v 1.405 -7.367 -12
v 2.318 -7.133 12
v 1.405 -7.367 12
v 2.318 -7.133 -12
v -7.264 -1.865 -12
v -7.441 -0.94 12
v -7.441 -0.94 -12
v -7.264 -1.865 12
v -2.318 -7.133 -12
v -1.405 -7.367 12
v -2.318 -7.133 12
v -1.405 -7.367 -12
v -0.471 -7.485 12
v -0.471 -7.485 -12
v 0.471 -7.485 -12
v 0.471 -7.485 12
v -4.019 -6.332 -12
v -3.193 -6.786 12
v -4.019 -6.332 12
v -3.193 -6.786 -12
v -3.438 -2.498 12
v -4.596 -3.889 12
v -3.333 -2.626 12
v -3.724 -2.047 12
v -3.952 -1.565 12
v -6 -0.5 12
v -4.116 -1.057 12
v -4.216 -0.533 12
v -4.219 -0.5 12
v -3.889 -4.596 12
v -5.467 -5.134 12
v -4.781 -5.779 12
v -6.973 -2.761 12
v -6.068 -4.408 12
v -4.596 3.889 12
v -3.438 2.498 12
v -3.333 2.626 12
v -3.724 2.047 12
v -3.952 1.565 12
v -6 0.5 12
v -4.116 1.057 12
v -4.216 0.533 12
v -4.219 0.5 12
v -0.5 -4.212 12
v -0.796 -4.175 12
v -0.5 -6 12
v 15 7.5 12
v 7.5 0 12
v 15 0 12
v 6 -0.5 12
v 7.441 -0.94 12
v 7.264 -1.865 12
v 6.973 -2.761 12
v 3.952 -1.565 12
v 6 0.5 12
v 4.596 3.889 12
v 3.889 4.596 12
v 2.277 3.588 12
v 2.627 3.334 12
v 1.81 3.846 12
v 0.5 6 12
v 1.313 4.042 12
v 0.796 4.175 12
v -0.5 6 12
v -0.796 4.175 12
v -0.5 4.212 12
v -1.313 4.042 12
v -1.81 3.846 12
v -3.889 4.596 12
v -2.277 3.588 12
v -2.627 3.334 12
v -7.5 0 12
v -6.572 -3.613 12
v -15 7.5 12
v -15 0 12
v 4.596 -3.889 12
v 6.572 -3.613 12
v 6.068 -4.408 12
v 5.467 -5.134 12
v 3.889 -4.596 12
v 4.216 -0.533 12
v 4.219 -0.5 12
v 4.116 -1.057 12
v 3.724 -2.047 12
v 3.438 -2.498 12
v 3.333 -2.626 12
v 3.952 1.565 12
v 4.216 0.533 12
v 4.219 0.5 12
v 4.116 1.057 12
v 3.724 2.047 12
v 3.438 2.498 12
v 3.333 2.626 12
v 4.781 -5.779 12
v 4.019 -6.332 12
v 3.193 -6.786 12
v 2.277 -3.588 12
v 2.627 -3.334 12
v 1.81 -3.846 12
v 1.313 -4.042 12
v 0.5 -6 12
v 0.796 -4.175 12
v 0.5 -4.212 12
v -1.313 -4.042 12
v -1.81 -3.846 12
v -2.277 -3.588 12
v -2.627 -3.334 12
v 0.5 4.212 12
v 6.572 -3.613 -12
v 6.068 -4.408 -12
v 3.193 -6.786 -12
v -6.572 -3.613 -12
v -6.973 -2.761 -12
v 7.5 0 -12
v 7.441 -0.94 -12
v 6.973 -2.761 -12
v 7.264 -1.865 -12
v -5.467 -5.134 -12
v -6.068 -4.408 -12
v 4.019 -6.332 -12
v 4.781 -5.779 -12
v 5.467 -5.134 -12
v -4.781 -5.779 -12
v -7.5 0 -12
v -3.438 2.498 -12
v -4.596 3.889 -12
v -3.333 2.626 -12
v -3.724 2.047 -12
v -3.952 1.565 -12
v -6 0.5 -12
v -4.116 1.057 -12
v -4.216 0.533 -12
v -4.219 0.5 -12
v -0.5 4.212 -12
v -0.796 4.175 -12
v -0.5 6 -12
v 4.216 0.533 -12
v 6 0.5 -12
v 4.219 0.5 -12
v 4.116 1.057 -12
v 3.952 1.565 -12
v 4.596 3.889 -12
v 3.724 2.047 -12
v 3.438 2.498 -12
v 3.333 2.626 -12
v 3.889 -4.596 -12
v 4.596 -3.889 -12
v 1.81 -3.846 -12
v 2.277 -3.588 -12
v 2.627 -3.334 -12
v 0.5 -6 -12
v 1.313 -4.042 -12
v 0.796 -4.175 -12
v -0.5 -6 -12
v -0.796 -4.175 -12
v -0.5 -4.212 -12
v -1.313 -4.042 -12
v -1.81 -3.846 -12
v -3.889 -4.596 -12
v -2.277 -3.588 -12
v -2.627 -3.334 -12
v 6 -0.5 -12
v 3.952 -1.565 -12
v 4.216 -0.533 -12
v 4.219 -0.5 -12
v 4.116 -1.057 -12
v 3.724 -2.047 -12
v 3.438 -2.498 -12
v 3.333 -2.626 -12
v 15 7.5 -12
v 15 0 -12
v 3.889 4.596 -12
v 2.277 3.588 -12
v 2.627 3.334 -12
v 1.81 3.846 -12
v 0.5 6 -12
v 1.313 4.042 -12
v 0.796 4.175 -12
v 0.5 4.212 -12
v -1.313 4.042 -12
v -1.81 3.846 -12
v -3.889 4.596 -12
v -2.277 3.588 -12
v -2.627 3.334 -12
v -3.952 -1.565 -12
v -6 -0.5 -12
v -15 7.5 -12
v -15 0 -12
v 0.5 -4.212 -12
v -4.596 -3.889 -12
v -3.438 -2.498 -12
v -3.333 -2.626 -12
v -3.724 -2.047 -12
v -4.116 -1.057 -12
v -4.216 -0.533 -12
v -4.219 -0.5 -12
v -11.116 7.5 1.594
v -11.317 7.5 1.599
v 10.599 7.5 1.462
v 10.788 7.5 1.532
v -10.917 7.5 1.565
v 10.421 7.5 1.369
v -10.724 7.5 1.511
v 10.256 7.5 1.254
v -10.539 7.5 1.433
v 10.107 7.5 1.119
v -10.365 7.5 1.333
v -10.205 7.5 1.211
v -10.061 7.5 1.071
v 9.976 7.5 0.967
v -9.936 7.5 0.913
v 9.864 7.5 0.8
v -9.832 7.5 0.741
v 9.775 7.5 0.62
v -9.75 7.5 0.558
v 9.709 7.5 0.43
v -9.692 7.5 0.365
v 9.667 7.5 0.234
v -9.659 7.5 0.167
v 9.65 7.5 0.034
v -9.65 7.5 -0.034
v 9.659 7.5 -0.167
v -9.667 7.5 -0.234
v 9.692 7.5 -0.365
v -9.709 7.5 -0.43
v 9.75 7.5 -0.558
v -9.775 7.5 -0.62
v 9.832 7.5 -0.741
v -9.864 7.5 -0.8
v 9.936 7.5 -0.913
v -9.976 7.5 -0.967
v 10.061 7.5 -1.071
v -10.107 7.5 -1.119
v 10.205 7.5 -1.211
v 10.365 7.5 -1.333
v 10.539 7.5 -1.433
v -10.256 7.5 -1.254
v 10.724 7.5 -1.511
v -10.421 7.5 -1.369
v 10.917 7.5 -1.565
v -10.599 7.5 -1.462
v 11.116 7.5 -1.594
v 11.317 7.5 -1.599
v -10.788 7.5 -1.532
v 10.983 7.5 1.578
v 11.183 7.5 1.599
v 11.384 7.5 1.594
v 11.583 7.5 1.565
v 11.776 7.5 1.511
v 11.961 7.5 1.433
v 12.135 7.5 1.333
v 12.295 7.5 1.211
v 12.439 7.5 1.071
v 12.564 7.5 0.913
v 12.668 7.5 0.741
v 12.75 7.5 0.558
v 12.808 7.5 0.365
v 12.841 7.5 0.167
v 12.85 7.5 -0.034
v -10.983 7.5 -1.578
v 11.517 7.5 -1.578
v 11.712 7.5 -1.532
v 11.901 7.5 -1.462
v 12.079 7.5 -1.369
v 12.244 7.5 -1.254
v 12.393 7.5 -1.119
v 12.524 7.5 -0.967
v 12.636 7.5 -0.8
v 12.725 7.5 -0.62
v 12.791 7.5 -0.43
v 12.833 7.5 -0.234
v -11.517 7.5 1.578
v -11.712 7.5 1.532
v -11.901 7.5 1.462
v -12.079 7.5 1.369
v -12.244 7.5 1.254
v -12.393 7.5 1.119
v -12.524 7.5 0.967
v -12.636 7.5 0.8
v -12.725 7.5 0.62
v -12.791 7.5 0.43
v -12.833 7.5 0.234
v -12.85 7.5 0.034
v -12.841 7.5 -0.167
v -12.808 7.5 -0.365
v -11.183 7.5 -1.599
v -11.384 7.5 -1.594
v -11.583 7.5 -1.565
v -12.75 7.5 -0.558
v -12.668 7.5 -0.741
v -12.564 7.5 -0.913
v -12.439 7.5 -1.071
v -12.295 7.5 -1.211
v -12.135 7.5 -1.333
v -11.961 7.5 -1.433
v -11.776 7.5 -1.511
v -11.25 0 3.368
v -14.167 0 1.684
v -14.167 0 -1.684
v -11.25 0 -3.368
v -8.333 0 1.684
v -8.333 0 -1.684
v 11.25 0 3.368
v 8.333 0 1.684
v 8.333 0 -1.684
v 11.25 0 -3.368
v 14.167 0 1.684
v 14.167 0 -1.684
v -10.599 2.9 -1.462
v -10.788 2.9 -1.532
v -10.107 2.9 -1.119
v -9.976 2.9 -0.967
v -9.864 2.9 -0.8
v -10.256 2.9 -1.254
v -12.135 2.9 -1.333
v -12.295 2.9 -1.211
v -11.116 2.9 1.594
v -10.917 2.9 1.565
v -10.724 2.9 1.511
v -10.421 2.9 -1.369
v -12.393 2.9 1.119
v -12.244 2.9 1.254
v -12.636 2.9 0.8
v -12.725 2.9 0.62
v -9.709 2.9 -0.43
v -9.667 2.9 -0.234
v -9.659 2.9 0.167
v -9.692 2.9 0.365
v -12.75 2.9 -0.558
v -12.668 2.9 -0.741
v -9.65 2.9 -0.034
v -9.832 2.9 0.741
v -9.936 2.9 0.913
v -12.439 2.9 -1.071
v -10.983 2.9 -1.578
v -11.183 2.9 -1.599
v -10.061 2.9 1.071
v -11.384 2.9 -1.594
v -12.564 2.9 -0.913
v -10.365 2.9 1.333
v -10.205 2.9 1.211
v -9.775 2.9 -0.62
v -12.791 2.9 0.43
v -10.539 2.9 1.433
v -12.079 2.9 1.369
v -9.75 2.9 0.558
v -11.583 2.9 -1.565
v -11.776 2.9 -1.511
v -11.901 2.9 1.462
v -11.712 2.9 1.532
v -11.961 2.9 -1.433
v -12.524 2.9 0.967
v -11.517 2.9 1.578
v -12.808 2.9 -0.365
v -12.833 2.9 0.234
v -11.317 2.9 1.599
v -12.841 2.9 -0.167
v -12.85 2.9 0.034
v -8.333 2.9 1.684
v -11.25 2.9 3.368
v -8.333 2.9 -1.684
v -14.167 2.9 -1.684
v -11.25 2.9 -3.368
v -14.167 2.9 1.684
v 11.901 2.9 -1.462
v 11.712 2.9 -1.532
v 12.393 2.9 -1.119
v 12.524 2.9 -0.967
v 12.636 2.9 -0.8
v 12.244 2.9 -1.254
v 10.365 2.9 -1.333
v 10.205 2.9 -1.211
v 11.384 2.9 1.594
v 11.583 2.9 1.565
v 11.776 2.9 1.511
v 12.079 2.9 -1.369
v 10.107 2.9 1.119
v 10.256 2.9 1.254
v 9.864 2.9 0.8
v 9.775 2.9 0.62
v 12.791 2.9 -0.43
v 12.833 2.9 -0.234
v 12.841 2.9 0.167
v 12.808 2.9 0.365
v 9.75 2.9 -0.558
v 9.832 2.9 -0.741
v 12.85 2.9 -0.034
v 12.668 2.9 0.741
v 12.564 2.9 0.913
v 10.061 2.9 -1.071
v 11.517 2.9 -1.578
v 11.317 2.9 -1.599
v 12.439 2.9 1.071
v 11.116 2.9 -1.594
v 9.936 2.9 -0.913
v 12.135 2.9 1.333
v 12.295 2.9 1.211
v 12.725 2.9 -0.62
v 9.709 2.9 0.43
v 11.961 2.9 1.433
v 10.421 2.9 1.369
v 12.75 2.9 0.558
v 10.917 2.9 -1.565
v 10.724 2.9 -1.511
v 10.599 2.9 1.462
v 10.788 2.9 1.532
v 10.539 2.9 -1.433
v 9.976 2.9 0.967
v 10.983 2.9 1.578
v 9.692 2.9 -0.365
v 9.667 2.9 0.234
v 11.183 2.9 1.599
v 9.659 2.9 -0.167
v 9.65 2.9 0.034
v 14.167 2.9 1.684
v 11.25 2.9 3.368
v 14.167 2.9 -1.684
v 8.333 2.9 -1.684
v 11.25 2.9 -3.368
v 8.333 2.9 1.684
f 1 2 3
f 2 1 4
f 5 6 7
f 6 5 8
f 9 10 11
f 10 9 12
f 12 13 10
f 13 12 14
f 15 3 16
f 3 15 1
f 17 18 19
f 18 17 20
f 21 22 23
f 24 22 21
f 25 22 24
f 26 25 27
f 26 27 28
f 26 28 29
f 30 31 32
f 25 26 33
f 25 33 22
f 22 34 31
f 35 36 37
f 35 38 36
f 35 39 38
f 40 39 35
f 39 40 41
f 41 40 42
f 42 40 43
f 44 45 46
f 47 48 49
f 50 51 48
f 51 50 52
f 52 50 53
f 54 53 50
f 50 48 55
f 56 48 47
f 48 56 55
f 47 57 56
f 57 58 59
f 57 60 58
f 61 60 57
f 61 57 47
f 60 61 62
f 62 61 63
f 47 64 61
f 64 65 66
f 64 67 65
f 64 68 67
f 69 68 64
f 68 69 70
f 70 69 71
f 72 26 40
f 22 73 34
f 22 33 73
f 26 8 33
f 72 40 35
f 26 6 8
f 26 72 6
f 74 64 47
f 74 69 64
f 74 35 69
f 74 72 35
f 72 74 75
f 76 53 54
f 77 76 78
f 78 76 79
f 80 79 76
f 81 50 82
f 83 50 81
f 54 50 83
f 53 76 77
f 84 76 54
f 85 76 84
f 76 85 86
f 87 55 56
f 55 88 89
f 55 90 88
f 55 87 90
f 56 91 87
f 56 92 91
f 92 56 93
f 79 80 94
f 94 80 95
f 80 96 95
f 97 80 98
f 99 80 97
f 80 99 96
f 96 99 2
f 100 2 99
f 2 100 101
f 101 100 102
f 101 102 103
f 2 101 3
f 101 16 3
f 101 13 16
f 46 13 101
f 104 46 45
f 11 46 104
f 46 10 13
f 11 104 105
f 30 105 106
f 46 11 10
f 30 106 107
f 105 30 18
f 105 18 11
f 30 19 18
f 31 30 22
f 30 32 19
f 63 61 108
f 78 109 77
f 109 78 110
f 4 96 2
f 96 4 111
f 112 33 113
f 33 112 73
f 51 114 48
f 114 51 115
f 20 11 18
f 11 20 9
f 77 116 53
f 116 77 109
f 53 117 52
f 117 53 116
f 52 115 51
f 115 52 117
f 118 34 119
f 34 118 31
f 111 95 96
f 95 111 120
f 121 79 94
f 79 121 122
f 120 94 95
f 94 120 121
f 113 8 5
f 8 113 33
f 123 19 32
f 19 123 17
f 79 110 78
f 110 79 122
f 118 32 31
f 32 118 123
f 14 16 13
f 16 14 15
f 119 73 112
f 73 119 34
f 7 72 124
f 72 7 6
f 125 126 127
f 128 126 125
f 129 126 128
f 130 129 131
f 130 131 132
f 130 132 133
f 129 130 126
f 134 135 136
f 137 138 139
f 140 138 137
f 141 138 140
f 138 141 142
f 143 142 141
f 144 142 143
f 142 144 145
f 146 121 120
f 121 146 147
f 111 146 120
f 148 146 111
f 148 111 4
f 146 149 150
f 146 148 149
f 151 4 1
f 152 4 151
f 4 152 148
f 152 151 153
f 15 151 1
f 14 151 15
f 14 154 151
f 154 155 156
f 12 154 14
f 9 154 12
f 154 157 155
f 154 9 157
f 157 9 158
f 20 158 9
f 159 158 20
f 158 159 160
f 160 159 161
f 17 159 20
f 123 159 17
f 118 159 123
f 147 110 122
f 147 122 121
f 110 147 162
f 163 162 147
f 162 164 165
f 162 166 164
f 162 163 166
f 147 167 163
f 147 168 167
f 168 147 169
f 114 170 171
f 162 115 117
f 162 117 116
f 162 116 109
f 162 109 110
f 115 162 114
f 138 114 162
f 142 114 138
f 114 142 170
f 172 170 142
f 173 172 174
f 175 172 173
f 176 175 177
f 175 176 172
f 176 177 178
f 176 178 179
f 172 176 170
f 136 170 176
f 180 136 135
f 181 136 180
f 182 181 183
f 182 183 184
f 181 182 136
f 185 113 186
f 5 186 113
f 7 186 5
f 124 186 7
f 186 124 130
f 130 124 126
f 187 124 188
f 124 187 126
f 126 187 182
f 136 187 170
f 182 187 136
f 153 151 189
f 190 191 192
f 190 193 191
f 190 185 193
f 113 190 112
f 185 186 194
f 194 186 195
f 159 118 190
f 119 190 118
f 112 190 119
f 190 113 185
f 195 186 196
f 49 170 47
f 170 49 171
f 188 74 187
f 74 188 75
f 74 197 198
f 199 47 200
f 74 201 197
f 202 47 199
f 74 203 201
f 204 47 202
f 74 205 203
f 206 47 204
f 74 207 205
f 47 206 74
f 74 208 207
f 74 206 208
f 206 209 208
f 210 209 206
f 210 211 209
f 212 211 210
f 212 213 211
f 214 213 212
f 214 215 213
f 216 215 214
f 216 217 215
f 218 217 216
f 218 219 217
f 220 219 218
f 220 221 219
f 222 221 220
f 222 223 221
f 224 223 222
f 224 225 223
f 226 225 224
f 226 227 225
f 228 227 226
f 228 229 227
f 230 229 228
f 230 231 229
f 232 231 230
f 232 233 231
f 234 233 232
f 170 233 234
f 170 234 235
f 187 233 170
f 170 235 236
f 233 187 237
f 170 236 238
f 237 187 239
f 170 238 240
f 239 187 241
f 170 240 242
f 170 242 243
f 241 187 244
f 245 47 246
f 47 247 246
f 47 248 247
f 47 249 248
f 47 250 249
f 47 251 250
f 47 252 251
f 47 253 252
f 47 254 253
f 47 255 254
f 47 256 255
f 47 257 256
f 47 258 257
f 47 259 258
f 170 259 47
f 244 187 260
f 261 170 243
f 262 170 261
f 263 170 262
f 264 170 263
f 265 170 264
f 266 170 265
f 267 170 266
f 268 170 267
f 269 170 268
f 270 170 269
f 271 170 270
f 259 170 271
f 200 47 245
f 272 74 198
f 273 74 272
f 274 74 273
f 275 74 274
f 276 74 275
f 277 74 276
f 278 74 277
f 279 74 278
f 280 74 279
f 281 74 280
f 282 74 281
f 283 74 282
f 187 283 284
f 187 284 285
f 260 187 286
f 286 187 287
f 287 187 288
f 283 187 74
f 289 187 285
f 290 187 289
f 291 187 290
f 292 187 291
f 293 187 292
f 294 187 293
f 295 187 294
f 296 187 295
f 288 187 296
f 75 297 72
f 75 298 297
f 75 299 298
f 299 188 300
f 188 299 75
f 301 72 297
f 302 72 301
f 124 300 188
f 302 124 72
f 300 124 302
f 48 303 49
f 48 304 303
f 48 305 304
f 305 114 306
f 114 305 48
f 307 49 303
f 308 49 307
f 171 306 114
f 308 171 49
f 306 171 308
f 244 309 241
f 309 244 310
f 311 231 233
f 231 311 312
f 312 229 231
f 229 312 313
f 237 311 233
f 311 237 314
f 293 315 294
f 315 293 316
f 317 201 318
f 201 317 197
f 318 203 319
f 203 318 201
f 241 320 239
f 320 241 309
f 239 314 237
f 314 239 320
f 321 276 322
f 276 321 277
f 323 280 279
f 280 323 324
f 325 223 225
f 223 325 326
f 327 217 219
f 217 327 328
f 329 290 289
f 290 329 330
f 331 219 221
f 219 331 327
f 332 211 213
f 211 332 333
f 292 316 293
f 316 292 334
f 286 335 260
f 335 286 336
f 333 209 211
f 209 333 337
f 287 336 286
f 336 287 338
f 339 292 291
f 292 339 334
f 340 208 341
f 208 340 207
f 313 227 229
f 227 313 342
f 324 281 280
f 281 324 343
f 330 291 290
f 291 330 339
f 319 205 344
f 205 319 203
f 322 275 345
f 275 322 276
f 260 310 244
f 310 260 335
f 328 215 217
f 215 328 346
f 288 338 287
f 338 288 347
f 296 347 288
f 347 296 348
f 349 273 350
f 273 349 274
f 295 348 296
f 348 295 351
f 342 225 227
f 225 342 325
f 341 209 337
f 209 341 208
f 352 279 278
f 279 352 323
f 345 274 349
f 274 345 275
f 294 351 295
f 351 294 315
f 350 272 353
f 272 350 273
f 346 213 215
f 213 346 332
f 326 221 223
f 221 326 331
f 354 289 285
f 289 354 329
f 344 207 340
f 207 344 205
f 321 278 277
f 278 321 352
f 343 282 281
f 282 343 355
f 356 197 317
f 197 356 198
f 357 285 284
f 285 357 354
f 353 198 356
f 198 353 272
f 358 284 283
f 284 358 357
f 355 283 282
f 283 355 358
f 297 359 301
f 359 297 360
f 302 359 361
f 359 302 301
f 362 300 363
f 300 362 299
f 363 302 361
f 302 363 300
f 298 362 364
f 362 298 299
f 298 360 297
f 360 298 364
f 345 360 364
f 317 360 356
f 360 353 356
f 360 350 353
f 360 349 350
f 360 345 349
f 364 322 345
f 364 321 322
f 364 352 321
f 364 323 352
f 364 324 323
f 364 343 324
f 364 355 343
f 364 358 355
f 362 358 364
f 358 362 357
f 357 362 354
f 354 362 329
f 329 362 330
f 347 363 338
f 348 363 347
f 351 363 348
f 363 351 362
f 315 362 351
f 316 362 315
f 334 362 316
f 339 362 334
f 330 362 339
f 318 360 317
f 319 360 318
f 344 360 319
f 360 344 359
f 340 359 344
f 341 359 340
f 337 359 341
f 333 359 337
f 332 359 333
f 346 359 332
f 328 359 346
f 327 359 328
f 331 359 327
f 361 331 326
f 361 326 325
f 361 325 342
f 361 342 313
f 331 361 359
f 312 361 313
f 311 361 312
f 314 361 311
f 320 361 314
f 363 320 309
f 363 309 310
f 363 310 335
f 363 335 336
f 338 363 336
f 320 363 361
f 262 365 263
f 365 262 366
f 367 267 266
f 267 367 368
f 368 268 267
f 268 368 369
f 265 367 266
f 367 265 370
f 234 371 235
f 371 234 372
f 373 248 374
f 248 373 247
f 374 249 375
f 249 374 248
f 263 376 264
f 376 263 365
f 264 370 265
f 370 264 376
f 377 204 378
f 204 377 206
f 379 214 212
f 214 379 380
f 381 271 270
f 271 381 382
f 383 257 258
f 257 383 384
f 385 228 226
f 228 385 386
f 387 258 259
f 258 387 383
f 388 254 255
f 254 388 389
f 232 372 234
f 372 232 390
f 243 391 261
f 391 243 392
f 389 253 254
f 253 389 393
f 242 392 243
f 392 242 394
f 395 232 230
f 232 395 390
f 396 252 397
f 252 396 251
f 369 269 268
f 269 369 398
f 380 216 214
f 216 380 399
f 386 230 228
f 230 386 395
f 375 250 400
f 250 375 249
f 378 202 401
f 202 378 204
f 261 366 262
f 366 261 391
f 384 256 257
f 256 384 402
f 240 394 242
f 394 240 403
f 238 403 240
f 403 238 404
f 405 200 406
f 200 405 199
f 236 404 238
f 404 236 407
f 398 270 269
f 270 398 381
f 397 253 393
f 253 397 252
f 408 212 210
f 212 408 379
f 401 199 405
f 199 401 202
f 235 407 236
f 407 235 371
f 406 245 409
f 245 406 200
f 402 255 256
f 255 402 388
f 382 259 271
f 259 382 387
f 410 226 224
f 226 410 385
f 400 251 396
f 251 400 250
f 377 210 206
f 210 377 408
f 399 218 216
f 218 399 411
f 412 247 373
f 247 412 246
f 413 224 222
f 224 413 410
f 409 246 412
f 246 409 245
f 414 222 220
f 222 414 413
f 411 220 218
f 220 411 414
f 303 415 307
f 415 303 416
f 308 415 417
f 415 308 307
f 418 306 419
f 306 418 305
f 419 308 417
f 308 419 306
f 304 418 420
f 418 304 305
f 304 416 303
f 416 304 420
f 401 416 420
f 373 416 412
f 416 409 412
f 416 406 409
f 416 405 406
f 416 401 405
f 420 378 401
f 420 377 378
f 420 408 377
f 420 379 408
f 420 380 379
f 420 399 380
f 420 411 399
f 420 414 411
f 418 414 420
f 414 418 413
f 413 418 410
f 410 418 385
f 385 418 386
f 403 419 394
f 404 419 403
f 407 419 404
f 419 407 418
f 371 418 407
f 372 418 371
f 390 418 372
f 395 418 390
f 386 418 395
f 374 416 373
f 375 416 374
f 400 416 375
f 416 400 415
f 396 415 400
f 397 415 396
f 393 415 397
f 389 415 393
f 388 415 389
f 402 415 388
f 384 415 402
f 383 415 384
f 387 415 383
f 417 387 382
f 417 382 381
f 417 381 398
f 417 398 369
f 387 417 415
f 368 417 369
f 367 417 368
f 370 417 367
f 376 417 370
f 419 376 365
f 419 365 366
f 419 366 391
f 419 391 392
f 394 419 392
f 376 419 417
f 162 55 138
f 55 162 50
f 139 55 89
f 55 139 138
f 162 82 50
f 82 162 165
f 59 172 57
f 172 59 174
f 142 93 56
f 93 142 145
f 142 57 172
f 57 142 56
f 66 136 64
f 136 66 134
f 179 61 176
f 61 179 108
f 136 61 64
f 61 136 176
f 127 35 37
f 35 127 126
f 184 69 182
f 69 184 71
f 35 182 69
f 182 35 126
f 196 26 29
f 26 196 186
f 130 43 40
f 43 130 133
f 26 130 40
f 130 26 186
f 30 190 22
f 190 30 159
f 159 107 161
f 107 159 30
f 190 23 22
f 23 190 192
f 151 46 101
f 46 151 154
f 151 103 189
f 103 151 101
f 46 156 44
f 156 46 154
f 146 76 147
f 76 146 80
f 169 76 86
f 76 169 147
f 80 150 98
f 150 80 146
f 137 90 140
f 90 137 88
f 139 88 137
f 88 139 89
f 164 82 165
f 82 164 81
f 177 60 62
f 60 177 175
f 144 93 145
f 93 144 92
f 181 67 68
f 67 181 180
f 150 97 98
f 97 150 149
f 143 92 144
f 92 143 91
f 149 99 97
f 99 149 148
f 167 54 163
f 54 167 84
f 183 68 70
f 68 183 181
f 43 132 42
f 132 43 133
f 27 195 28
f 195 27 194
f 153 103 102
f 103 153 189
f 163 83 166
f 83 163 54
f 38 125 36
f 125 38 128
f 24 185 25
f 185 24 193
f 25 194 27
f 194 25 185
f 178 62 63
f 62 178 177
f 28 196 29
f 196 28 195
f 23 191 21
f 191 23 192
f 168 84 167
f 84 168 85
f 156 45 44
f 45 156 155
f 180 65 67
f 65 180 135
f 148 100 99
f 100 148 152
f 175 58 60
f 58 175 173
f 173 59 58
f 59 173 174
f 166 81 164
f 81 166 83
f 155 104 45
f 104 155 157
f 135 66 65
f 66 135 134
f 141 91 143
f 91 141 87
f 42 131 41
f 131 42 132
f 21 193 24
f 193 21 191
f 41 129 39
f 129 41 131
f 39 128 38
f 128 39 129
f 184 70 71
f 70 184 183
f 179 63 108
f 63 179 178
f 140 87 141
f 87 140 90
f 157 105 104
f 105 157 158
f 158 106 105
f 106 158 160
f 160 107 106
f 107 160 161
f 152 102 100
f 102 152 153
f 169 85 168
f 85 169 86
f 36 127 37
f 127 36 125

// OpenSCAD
/*
    To create plastic linear bearings similar to the Igus® Drylin® RJ4JP-01-08 Sliding Bearing.

    You can choose to either create just the bearing or incorporate it in a block ready to mount.
    
    print in PLA for the properties of the harder plastic also concidder some kind of lubrication.
    
    inspired by:
    Toothed Linear Bearing by KR2
    www.thingiverse.com/thing:18219
    
    And 
    
    SC8UU Bushing by AxMod
    www.thingiverse.com/thing:1126245
    

*/

/* [Bearing Settings]*/

Inside_Diameter = 8;
Outside_Diameter = 15;
Length = 24;
Wall_Thickness = 1.5;
Number_of_teeth = 8;


Block = "yes"; // [yes, no]

/* [Block Settings]*/

How_Many_Mounting_Holes = 2; //[0, 2, 4, 6]
//The Diameter of the mounting holes so for an M3 bolt put 3 if you want to cut your own thread or 3.4 if you prefer to use with a nut
Mounting_Holes_Diameter = 3.2;
// Size of the nut across it's flats
Nut_size = 5.4;
// Set to 0 if you do not want retaining holes for nut
Nut_Depth = 3;


// need to create the 30 degrees champher properly.

difference()
{
    union()
    {
        if (Block == "yes")
        {
            cylinder (h=Length, d= Outside_Diameter, center = true, $fn = 50);
            translate ([-Outside_Diameter,0,-0.5*Length]) cube([Outside_Diameter *2,0.5*Outside_Diameter, Length]);
        }
        if (Block == "no")
        {
        cylinder (h=Length -3, d= Outside_Diameter, center = true, $fn = 50);
        translate ([0,0,(Length - 3) /2]) cylinder (h=1.5 , d1= Outside_Diameter, d2 = Outside_Diameter-1.74, center = false, $fn = 50);
        translate ([0,0,-Length/2 ]) cylinder (h=1.5 , d2= Outside_Diameter, d1 = Outside_Diameter-1.74, center = false, $fn = 50);
        }
    }    
    cylinder (h=Length+ 0.2, d= Inside_Diameter+0.5, center = true, $fn = 50); // remove core
    
// remove bands on outside
    if (Block == "no")
    {
    translate ([0,0,(Length /2) - 3.25 - 1.1])
    {
        difference()
        {
            cylinder(h = 1.1, d= Outside_Diameter, center = false, $fn = 50);
            cylinder(h = 1.1, d= Outside_Diameter-0.4, center = false, $fn = 50);
        }
    }
    
        translate ([0,0,-(Length /2) + 3.25 ])
    {
        difference()
        {
            cylinder(h = 1.1, d= Outside_Diameter, center = false, $fn = 50);
            cylinder(h = 1.1, d= Outside_Diameter-0.4, center = false, $fn = 50);
        }
    }
    }
// Remove Mounting Holes for Block
    if (Block == "yes")
        {
            if (How_Many_Mounting_Holes == 2)
            {
                translate ([0,0,0])Screw_Holes ();
            }
            if (How_Many_Mounting_Holes == 4)
            {
                translate ([0,0,0.25*Length])Screw_Holes ();
                translate ([0,0,-0.25*Length])Screw_Holes ();
            }
            if (How_Many_Mounting_Holes == 6)
            {
                translate ([0,0,0.25*Length])Screw_Holes ();
                translate ([0,0,0])Screw_Holes ();
                translate ([0,0,-0.25*Length])Screw_Holes ();
            }
        }
    
// Teeth    
    for ( i = [ 0: Number_of_teeth])
    {
        A = 360 / Number_of_teeth;
        rotate ([0,0, A * i]) 
        {
            translate([0,-0.5,-(Length/2)]) cube ([0.5*(Outside_Diameter -(Wall_Thickness*2)),1,Length]);
            /*
            // this gives the slots between the teeth a rounded end but takes ages to render.
            intersection() 
            {
                cylinder ( h=Length, d = Outside_Diameter -(Wall_Thickness*2), center = true, $fn = 50);
                translate ([0,-0.5,- Length/2])cube(size = [(0.5*Outside_Diameter),1,Length], center = false);
            }*/
           // Hollow out teeth
            
        }
    }
    
}

module Screw_Holes ()
{
    
    nut = 2*((Nut_size / 2) / cos(30))+0.5;
    translate ([-0.75 *Outside_Diameter,-0.1,0])rotate([270,30,0]) 
    {
        cylinder(h=0.55*Outside_Diameter ,d=Mounting_Holes_Diameter, $fn = 50);
        cylinder(h=Nut_Depth ,d=nut, $fn = 6);
    }
    translate ([0.75 *Outside_Diameter,-0.1,0])rotate([270,30,0]) 
    {
        cylinder(h=0.55*Outside_Diameter ,d=Mounting_Holes_Diameter, $fn = 50);
        cylinder(h=Nut_Depth ,d=nut, $fn = 6);
    }

    
}
